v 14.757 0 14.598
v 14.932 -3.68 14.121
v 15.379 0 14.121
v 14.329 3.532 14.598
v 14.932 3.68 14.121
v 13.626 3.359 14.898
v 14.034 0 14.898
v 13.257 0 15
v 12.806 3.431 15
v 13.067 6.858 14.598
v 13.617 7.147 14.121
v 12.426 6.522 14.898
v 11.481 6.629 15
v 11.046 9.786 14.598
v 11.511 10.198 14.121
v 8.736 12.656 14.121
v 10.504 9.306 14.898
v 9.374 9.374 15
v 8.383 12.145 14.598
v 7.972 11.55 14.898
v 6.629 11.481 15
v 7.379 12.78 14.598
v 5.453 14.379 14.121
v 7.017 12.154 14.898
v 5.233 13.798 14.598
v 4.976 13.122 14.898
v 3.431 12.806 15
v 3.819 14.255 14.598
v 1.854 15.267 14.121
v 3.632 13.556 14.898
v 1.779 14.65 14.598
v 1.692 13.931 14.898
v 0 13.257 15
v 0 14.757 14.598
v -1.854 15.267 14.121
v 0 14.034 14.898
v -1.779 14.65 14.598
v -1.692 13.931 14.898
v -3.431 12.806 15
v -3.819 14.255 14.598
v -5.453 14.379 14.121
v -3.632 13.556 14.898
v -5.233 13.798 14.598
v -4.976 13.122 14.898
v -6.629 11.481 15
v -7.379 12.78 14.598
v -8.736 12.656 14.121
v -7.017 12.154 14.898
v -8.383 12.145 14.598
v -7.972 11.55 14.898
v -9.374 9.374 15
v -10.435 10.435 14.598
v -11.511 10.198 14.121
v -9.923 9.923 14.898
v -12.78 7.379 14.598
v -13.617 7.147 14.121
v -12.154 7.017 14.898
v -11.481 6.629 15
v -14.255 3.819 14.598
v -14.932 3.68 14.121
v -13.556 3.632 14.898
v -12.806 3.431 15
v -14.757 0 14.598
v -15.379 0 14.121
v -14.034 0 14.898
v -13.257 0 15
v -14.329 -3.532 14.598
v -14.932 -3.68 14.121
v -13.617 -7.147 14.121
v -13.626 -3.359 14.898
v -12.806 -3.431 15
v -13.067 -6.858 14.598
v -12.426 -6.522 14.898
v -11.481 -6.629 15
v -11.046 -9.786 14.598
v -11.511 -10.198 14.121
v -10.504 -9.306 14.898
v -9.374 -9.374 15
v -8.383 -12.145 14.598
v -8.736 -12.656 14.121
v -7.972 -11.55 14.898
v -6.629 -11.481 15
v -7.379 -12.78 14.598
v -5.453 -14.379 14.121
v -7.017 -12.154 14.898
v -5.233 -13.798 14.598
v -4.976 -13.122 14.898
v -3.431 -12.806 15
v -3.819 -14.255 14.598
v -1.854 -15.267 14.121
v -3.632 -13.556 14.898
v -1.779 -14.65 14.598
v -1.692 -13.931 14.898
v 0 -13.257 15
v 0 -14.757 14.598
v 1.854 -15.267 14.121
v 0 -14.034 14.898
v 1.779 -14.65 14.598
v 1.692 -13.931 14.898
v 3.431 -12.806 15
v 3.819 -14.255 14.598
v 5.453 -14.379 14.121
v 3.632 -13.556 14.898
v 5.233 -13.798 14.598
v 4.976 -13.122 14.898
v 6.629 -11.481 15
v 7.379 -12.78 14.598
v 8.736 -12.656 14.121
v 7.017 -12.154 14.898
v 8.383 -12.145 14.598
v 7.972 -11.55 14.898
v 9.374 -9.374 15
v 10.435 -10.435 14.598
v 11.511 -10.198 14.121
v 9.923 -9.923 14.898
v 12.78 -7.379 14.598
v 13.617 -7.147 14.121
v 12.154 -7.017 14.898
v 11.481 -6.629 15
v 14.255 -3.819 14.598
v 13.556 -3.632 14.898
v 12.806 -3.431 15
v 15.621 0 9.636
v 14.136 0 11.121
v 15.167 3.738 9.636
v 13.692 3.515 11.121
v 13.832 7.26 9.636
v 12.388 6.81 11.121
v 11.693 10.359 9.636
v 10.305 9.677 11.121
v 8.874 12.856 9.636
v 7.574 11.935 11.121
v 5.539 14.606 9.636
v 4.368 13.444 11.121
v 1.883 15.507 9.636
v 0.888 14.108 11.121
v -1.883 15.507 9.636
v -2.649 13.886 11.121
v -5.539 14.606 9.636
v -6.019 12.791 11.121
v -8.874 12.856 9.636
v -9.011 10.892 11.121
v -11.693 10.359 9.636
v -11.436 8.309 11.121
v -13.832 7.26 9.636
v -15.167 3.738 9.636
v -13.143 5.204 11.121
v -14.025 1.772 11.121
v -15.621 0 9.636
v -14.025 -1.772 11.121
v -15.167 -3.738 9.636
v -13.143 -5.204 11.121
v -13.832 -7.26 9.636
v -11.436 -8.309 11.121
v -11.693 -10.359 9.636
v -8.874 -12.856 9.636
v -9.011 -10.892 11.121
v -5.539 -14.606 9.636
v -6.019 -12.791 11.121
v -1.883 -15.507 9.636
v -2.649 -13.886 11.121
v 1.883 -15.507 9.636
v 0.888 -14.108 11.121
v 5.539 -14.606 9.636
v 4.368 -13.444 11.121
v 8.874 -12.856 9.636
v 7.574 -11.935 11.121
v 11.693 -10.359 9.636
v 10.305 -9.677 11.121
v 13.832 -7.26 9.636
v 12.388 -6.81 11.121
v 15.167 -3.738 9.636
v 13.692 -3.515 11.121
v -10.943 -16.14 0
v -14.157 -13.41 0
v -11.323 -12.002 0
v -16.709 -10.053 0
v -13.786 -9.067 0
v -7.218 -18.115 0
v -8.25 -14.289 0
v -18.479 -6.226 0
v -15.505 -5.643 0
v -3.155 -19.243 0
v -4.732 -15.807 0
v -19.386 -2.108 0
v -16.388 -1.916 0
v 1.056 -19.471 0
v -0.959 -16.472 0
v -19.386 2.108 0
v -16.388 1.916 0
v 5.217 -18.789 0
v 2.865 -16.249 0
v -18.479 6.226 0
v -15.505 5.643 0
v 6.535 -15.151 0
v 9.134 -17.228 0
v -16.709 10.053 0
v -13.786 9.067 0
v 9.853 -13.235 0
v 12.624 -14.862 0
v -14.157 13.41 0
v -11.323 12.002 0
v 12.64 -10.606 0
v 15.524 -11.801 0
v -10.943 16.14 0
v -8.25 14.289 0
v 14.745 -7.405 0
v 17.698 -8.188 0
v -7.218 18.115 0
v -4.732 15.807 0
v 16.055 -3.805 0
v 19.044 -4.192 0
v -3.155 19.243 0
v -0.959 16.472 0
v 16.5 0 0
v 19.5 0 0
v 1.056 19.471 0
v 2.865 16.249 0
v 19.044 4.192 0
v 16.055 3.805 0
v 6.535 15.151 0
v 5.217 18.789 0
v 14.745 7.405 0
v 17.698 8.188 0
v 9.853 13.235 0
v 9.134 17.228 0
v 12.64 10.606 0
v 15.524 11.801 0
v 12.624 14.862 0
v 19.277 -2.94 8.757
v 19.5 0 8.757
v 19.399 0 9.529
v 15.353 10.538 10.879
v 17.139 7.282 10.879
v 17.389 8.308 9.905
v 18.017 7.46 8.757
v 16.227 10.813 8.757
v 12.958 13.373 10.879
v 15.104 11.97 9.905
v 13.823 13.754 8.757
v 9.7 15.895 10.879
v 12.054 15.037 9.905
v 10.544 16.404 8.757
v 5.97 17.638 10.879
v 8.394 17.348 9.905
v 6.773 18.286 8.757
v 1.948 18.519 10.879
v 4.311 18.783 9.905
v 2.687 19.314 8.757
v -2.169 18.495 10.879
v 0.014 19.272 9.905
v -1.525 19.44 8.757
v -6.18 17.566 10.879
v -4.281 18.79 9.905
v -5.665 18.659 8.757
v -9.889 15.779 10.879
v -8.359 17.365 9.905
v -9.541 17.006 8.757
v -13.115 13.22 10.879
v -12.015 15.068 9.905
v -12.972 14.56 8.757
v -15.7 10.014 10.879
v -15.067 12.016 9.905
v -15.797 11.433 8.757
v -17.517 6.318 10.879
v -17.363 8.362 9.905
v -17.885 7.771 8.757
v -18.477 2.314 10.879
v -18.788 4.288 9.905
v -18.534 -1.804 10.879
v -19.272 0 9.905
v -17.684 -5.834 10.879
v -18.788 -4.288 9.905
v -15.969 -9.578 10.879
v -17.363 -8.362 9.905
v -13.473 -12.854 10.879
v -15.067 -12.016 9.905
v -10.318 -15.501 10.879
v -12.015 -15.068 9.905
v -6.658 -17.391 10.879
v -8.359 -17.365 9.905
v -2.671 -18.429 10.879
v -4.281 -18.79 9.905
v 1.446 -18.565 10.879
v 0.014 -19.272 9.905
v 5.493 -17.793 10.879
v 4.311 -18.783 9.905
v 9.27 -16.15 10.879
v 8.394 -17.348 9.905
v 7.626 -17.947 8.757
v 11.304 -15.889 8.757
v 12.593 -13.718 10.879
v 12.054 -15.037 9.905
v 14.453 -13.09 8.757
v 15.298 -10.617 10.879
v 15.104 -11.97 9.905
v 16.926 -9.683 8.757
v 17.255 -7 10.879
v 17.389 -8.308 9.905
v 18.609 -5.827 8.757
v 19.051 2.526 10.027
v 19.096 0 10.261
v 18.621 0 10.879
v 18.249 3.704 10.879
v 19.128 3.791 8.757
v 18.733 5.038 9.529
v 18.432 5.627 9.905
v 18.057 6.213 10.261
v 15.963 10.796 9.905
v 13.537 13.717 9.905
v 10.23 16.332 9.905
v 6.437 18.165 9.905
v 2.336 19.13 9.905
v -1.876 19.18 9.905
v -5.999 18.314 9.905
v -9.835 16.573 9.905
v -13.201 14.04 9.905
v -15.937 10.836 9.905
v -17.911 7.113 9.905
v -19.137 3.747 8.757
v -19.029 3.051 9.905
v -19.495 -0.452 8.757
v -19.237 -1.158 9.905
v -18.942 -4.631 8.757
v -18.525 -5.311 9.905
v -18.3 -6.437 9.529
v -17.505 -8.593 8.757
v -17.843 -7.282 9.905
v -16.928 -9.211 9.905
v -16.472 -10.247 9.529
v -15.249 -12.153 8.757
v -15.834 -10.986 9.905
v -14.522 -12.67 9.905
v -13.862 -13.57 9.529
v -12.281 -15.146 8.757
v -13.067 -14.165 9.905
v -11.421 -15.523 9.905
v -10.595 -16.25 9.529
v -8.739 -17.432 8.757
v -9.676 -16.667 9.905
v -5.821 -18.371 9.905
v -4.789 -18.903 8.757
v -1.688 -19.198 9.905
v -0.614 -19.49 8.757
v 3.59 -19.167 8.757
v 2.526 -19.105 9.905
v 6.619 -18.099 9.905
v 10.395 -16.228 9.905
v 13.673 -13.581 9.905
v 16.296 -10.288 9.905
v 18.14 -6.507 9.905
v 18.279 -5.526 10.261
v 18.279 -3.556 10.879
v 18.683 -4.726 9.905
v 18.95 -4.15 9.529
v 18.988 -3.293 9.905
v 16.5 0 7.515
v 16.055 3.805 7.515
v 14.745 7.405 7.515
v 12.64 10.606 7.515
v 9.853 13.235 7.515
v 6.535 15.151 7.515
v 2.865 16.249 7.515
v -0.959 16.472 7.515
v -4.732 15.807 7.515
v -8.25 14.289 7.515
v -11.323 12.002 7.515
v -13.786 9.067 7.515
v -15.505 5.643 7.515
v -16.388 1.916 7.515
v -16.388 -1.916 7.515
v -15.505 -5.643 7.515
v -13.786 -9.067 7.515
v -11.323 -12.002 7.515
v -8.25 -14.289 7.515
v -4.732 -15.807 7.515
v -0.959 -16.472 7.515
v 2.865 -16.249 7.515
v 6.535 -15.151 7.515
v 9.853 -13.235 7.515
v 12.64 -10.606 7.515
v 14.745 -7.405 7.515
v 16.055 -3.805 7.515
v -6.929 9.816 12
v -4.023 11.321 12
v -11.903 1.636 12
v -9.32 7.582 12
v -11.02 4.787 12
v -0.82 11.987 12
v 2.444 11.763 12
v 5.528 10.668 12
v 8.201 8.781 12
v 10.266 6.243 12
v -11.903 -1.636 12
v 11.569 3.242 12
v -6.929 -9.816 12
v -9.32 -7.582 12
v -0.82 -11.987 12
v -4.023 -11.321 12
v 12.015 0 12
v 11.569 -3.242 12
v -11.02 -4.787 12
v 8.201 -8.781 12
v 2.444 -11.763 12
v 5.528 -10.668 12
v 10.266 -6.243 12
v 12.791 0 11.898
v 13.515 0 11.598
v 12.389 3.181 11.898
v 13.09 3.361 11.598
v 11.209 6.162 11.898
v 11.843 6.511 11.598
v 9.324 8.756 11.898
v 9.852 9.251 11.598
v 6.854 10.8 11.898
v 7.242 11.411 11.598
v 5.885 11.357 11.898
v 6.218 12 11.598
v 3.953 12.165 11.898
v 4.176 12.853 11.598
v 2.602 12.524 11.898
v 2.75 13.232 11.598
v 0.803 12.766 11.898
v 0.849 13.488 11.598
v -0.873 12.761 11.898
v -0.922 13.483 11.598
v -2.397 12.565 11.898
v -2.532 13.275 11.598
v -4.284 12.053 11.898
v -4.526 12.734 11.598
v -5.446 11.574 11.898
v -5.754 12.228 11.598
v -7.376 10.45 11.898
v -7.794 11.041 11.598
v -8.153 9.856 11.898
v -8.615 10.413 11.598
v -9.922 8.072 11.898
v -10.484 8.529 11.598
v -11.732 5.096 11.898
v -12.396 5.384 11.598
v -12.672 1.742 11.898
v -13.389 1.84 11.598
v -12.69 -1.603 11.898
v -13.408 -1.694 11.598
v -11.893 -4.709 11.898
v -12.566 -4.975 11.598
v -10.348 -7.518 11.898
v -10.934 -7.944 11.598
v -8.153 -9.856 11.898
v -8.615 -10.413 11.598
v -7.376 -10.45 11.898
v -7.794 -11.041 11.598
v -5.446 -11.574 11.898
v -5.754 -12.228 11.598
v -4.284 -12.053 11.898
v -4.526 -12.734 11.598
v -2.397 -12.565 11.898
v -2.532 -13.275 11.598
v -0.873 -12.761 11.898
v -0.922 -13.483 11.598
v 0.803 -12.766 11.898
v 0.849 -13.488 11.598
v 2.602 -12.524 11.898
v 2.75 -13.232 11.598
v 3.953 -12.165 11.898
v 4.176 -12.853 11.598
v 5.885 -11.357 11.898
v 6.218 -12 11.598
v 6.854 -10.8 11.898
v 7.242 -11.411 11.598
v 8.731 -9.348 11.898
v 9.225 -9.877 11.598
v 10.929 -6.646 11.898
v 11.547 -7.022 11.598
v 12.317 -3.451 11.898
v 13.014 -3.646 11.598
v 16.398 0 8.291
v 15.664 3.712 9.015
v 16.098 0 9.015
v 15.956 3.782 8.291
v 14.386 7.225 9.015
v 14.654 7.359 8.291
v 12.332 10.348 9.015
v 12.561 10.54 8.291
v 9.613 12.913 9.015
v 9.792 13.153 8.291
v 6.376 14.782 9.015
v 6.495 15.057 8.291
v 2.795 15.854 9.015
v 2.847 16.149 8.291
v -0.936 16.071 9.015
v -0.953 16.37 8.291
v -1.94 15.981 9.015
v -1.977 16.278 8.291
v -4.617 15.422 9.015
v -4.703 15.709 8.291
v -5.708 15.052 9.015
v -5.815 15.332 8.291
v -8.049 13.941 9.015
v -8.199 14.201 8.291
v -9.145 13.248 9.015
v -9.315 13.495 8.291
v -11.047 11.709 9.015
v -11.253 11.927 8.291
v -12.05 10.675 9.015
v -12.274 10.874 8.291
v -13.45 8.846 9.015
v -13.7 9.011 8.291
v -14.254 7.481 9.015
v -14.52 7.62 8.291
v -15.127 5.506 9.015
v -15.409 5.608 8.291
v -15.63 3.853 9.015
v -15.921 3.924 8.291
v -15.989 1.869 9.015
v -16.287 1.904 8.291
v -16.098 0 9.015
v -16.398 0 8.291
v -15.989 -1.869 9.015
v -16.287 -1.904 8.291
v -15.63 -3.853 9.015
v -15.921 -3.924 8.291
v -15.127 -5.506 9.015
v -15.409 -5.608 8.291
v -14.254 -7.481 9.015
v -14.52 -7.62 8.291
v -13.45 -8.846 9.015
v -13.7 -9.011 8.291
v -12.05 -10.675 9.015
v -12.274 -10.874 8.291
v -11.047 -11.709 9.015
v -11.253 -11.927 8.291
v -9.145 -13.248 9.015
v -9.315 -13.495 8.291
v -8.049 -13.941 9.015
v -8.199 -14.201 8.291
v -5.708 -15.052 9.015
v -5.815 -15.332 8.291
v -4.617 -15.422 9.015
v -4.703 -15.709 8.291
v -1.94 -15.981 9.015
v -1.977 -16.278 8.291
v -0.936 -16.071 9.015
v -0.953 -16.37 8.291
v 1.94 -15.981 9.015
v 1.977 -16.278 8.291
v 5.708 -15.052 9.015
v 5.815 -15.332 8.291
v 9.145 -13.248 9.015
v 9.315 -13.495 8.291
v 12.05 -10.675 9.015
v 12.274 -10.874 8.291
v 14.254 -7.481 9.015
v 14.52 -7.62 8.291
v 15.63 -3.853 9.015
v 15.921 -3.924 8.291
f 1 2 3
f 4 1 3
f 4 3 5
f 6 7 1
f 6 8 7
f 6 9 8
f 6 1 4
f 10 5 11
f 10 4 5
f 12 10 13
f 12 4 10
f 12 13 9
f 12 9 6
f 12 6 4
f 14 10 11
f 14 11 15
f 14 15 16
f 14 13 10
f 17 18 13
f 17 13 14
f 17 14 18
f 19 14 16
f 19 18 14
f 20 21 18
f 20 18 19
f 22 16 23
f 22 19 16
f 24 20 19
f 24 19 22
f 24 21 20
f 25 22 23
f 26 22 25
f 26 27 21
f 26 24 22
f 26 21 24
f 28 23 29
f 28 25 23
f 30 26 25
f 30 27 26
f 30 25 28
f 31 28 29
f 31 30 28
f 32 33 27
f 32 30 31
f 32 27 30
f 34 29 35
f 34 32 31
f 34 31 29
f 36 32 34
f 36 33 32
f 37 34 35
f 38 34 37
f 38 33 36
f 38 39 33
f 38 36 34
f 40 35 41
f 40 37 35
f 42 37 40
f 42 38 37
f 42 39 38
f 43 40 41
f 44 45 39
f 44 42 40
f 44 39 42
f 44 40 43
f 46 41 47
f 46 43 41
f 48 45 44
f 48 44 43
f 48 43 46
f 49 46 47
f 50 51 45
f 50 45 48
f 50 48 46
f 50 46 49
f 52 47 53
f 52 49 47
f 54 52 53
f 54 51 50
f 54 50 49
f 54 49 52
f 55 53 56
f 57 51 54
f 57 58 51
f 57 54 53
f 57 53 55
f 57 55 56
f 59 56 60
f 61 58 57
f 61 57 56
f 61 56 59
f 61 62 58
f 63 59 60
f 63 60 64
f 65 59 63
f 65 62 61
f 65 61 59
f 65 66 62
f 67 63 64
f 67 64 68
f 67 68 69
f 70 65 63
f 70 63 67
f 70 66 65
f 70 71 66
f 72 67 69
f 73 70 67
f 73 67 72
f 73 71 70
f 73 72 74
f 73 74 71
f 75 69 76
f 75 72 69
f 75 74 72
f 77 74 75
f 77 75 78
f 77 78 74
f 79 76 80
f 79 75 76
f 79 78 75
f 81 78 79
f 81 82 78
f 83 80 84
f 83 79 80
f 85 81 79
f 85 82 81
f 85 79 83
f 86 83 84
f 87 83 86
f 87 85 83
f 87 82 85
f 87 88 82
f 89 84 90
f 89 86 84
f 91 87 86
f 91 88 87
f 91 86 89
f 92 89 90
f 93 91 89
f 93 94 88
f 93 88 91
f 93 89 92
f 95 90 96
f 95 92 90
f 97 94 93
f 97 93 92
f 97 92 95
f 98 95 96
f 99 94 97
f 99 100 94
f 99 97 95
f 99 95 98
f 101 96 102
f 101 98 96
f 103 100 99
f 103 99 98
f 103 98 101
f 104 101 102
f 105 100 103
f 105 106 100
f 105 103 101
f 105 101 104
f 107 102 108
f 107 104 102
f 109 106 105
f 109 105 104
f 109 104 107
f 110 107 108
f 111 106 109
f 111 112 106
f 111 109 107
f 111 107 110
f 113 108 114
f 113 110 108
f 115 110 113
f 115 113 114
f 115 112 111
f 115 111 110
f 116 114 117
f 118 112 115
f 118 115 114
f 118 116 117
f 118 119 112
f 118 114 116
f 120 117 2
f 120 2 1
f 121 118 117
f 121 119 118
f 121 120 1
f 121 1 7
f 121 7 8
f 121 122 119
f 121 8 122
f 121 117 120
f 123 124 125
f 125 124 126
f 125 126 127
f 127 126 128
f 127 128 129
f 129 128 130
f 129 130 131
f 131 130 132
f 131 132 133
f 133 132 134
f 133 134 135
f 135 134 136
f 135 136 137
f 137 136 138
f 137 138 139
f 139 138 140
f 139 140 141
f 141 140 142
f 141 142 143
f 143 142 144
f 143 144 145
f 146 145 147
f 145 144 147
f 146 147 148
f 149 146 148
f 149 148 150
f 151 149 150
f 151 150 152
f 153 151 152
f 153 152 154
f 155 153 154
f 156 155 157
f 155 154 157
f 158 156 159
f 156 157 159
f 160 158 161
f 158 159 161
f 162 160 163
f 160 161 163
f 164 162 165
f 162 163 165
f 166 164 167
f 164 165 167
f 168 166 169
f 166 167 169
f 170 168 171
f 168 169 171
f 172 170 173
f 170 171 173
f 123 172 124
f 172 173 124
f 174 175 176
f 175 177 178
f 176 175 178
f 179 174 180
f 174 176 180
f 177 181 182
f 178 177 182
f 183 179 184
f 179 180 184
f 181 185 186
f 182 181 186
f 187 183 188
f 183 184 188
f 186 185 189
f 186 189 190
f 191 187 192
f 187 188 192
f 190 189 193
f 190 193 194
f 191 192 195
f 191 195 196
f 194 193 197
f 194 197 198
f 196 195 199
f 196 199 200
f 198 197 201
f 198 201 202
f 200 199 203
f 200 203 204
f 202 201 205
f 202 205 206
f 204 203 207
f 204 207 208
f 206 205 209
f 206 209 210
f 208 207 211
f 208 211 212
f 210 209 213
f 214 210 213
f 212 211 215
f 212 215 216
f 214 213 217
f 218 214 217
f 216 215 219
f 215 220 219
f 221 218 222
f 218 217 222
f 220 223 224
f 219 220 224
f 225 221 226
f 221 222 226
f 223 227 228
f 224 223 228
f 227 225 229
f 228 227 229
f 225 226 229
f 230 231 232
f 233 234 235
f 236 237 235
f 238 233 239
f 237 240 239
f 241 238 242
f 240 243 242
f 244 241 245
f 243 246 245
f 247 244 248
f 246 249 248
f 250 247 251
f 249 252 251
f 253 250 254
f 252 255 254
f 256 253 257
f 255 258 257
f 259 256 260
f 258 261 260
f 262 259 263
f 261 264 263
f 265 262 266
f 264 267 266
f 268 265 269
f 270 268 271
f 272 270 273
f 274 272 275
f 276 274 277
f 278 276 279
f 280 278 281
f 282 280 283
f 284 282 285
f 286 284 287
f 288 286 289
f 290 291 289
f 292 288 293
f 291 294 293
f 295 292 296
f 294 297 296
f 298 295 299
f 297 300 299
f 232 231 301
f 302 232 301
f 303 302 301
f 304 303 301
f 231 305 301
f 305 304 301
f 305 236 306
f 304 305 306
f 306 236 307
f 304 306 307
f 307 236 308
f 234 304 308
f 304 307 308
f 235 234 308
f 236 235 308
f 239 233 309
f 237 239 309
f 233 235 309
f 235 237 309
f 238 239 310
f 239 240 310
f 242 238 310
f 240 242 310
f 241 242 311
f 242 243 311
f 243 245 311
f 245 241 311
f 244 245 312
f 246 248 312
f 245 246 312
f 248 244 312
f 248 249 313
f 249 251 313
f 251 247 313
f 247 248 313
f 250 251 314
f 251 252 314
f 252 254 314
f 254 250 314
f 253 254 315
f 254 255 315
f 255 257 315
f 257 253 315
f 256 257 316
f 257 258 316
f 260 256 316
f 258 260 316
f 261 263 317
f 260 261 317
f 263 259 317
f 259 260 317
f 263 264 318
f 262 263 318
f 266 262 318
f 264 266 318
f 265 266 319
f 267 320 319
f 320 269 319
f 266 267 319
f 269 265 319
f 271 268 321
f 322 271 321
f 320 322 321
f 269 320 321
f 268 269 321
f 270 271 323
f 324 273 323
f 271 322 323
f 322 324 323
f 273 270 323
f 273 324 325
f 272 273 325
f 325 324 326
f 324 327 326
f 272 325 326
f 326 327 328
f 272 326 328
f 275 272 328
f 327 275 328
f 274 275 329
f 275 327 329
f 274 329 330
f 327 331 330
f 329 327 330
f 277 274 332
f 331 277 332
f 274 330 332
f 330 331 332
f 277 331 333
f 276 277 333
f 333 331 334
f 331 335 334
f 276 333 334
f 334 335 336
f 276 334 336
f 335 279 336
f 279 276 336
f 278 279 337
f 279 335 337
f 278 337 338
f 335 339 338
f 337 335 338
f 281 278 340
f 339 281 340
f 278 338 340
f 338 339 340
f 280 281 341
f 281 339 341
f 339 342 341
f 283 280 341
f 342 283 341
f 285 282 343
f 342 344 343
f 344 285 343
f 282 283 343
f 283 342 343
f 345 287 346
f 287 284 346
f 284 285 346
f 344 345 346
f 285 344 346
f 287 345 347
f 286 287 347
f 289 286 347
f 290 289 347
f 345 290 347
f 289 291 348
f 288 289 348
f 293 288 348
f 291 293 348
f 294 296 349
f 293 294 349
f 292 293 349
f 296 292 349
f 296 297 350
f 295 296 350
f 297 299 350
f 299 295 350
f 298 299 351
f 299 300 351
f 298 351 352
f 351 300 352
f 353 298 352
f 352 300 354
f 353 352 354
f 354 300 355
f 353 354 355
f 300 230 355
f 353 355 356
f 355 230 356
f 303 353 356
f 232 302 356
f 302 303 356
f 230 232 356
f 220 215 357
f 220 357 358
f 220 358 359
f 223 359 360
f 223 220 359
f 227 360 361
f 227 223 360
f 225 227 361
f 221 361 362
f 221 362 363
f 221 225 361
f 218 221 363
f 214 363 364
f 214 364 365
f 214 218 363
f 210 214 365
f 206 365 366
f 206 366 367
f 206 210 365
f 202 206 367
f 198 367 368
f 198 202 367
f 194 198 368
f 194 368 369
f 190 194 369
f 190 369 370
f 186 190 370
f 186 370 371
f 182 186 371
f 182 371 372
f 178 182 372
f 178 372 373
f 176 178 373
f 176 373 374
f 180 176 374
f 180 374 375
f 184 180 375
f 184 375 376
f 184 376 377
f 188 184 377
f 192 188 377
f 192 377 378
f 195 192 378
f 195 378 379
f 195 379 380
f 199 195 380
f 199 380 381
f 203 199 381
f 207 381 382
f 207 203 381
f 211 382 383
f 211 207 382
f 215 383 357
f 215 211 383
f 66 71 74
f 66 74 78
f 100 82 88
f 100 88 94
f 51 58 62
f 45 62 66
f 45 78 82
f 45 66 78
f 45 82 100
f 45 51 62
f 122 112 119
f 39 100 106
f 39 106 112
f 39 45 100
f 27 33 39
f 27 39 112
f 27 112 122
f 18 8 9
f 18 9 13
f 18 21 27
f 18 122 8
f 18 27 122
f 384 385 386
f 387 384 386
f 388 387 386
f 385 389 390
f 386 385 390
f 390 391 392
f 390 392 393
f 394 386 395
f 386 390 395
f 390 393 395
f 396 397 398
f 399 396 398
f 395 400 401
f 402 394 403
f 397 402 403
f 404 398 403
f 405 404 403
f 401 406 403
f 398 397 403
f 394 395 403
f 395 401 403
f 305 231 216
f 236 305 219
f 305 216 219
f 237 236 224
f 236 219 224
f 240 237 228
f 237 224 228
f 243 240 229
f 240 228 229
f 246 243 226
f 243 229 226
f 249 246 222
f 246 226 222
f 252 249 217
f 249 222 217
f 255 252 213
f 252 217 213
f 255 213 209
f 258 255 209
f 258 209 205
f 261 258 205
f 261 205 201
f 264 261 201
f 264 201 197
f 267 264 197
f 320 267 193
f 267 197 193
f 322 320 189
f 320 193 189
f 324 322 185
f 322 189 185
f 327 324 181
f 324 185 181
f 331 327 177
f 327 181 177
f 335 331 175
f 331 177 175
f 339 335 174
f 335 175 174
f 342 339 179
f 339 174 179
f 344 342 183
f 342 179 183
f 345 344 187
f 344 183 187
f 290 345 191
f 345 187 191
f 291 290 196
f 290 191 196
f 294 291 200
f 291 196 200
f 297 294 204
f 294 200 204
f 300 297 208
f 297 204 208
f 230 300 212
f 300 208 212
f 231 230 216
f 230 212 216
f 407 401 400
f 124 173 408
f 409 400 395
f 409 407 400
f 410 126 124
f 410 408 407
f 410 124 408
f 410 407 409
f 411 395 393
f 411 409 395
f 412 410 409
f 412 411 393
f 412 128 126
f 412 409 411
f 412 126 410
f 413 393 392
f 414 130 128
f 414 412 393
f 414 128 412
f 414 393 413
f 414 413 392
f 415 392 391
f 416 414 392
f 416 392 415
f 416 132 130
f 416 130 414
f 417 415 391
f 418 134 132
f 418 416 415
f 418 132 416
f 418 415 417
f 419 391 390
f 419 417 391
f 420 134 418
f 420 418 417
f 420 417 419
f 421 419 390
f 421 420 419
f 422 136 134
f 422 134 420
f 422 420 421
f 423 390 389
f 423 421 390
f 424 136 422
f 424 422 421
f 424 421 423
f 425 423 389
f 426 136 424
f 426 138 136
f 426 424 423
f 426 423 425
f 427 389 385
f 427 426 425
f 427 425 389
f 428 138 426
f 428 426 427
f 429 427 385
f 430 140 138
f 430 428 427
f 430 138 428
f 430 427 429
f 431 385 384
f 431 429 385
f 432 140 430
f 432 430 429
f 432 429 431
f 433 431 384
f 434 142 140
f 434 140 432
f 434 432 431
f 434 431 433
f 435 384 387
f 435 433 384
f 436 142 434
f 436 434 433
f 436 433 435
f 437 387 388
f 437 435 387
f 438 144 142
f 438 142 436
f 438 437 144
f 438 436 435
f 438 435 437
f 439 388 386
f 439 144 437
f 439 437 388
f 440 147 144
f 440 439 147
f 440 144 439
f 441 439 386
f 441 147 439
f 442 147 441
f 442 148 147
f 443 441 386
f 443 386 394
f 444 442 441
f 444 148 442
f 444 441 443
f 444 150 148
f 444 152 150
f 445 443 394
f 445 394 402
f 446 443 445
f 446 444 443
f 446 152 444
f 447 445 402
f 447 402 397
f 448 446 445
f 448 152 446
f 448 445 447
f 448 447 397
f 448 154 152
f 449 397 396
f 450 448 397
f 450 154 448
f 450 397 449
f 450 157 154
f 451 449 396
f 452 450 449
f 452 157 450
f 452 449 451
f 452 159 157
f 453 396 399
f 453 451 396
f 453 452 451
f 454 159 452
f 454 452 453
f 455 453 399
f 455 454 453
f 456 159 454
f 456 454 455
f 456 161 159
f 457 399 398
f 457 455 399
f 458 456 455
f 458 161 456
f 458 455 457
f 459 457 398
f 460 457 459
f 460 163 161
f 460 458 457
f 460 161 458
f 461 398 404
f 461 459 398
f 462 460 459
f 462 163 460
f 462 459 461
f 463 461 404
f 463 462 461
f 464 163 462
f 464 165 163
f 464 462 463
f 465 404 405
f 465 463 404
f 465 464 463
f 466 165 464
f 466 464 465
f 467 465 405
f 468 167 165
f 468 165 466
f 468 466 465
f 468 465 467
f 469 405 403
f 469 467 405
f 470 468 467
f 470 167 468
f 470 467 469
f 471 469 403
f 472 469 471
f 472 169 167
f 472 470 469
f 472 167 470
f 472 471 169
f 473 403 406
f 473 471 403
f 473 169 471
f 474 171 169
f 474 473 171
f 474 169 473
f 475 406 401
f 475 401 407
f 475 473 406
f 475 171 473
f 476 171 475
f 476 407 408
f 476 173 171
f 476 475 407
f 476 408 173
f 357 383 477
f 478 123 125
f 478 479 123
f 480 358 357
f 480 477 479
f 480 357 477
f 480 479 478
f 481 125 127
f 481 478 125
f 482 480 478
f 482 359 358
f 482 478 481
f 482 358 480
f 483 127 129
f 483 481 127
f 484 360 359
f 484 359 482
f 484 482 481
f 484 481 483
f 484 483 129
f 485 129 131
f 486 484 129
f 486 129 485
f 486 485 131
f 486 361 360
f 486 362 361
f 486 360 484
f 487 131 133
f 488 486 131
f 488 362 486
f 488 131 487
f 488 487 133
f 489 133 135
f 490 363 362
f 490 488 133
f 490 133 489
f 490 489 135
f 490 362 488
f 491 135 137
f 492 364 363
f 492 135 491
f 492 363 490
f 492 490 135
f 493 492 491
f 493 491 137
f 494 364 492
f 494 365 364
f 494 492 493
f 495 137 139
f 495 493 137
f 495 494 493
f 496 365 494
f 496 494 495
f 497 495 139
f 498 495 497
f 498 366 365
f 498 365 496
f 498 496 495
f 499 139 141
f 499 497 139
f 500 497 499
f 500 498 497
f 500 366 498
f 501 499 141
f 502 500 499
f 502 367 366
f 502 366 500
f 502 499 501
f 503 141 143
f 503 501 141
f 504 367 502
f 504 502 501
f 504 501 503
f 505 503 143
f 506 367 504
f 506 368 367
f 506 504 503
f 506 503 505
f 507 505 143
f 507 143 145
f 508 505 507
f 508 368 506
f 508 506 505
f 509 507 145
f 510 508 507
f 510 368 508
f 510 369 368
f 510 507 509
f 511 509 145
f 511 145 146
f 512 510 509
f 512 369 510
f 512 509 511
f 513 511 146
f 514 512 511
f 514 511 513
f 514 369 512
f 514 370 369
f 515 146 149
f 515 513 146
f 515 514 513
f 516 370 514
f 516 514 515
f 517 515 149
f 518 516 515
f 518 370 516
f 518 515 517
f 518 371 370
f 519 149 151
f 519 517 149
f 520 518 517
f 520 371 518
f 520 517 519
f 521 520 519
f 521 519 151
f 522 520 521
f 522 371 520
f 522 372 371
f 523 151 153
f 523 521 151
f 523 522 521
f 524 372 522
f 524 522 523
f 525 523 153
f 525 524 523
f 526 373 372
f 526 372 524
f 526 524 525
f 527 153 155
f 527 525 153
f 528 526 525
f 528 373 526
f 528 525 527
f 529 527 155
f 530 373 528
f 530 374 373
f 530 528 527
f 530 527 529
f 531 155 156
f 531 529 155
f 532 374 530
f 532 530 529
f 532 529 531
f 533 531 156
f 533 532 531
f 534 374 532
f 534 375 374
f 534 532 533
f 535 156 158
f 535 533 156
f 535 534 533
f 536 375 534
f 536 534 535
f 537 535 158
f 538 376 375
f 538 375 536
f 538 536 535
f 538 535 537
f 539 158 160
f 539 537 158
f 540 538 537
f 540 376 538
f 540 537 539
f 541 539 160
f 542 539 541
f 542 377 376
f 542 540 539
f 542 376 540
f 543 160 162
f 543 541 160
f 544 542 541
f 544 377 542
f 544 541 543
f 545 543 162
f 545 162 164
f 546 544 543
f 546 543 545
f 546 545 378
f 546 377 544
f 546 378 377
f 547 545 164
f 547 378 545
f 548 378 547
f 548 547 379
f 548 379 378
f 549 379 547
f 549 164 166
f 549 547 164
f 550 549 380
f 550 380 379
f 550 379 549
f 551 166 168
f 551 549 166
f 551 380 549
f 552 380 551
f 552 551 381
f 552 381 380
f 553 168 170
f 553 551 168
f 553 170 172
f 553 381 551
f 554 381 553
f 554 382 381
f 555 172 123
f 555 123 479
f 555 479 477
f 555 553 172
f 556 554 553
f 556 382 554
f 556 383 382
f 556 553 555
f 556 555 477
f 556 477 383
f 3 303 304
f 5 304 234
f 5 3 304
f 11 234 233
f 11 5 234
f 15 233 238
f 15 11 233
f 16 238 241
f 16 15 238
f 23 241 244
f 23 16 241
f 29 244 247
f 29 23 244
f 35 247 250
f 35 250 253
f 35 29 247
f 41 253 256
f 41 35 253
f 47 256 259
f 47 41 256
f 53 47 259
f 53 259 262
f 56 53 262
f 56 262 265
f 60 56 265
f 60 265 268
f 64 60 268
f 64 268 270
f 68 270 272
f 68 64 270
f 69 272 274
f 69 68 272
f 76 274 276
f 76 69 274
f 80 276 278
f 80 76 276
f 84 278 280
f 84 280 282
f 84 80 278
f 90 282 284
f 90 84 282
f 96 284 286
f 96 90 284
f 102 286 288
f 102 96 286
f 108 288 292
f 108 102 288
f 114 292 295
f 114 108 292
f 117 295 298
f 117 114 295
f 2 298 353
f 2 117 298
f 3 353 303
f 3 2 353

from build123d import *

# Parameters (mm, degrees)
SKETCH1_R           = 19.5
BOSS_EXTRUDE1_DEPTH = 15
CHAMFER1_SIZE       = 5
FILLET1_R           = 3
SHELL1_T            = -3


with BuildPart() as part:
    # Sketch1 → Boss-Extrude1 (new body)
    with BuildSketch(Plane.XY):
        Circle(SKETCH1_R)
    extrude(amount=BOSS_EXTRUDE1_DEPTH)

    # Chamfer1
    chamfer1_edges = [part.edges().sort_by_distance(p)[0] for p in [
        (-19.5, 0, 15),
    ]]
    chamfer(chamfer1_edges, length=CHAMFER1_SIZE)

    # Fillet1
    fillet1_edges = [part.edges().sort_by_distance(p)[0] for p in [
        (-14.5, 0, 15),
        (-19.5, 0, 10),
    ]]
    fillet(fillet1_edges, radius=FILLET1_R)

    # Shell1
    shell1_openings = [part.faces().sort_by_distance(p)[0] for p in [
        (0, 0, 0),
    ]]
    offset(amount=SHELL1_T, openings=shell1_openings, kind=Kind.INTERSECTION)

    # Fillet2: read off the stored shape, not the designer's step
    # Fillet2 outline → Fillet2 (revolve)
    with BuildSketch(Plane.XZ):
        with BuildLine():
            Line((16.5, 9.636038969), (15.621320344, 9.636038969))
            ThreePointArc((15.621320344, 9.636038969), (16.271638598, 8.662768923), (16.5, 7.514718626))
            Line((16.5, 7.514718626), (16.5, 9.636038969))
        make_face()
        with BuildLine():
            ThreePointArc((12.014718626, 12), (13.162768923, 11.771638598), (14.136038969, 11.121320344))
            Line((14.136038969, 11.121320344), (14.136038969, 12))
            Line((14.136038969, 12), (12.014718626, 12))
        make_face()
    revolve(axis=Axis((0, 0, 0), (0, 0, 1)))


solid = part.part
